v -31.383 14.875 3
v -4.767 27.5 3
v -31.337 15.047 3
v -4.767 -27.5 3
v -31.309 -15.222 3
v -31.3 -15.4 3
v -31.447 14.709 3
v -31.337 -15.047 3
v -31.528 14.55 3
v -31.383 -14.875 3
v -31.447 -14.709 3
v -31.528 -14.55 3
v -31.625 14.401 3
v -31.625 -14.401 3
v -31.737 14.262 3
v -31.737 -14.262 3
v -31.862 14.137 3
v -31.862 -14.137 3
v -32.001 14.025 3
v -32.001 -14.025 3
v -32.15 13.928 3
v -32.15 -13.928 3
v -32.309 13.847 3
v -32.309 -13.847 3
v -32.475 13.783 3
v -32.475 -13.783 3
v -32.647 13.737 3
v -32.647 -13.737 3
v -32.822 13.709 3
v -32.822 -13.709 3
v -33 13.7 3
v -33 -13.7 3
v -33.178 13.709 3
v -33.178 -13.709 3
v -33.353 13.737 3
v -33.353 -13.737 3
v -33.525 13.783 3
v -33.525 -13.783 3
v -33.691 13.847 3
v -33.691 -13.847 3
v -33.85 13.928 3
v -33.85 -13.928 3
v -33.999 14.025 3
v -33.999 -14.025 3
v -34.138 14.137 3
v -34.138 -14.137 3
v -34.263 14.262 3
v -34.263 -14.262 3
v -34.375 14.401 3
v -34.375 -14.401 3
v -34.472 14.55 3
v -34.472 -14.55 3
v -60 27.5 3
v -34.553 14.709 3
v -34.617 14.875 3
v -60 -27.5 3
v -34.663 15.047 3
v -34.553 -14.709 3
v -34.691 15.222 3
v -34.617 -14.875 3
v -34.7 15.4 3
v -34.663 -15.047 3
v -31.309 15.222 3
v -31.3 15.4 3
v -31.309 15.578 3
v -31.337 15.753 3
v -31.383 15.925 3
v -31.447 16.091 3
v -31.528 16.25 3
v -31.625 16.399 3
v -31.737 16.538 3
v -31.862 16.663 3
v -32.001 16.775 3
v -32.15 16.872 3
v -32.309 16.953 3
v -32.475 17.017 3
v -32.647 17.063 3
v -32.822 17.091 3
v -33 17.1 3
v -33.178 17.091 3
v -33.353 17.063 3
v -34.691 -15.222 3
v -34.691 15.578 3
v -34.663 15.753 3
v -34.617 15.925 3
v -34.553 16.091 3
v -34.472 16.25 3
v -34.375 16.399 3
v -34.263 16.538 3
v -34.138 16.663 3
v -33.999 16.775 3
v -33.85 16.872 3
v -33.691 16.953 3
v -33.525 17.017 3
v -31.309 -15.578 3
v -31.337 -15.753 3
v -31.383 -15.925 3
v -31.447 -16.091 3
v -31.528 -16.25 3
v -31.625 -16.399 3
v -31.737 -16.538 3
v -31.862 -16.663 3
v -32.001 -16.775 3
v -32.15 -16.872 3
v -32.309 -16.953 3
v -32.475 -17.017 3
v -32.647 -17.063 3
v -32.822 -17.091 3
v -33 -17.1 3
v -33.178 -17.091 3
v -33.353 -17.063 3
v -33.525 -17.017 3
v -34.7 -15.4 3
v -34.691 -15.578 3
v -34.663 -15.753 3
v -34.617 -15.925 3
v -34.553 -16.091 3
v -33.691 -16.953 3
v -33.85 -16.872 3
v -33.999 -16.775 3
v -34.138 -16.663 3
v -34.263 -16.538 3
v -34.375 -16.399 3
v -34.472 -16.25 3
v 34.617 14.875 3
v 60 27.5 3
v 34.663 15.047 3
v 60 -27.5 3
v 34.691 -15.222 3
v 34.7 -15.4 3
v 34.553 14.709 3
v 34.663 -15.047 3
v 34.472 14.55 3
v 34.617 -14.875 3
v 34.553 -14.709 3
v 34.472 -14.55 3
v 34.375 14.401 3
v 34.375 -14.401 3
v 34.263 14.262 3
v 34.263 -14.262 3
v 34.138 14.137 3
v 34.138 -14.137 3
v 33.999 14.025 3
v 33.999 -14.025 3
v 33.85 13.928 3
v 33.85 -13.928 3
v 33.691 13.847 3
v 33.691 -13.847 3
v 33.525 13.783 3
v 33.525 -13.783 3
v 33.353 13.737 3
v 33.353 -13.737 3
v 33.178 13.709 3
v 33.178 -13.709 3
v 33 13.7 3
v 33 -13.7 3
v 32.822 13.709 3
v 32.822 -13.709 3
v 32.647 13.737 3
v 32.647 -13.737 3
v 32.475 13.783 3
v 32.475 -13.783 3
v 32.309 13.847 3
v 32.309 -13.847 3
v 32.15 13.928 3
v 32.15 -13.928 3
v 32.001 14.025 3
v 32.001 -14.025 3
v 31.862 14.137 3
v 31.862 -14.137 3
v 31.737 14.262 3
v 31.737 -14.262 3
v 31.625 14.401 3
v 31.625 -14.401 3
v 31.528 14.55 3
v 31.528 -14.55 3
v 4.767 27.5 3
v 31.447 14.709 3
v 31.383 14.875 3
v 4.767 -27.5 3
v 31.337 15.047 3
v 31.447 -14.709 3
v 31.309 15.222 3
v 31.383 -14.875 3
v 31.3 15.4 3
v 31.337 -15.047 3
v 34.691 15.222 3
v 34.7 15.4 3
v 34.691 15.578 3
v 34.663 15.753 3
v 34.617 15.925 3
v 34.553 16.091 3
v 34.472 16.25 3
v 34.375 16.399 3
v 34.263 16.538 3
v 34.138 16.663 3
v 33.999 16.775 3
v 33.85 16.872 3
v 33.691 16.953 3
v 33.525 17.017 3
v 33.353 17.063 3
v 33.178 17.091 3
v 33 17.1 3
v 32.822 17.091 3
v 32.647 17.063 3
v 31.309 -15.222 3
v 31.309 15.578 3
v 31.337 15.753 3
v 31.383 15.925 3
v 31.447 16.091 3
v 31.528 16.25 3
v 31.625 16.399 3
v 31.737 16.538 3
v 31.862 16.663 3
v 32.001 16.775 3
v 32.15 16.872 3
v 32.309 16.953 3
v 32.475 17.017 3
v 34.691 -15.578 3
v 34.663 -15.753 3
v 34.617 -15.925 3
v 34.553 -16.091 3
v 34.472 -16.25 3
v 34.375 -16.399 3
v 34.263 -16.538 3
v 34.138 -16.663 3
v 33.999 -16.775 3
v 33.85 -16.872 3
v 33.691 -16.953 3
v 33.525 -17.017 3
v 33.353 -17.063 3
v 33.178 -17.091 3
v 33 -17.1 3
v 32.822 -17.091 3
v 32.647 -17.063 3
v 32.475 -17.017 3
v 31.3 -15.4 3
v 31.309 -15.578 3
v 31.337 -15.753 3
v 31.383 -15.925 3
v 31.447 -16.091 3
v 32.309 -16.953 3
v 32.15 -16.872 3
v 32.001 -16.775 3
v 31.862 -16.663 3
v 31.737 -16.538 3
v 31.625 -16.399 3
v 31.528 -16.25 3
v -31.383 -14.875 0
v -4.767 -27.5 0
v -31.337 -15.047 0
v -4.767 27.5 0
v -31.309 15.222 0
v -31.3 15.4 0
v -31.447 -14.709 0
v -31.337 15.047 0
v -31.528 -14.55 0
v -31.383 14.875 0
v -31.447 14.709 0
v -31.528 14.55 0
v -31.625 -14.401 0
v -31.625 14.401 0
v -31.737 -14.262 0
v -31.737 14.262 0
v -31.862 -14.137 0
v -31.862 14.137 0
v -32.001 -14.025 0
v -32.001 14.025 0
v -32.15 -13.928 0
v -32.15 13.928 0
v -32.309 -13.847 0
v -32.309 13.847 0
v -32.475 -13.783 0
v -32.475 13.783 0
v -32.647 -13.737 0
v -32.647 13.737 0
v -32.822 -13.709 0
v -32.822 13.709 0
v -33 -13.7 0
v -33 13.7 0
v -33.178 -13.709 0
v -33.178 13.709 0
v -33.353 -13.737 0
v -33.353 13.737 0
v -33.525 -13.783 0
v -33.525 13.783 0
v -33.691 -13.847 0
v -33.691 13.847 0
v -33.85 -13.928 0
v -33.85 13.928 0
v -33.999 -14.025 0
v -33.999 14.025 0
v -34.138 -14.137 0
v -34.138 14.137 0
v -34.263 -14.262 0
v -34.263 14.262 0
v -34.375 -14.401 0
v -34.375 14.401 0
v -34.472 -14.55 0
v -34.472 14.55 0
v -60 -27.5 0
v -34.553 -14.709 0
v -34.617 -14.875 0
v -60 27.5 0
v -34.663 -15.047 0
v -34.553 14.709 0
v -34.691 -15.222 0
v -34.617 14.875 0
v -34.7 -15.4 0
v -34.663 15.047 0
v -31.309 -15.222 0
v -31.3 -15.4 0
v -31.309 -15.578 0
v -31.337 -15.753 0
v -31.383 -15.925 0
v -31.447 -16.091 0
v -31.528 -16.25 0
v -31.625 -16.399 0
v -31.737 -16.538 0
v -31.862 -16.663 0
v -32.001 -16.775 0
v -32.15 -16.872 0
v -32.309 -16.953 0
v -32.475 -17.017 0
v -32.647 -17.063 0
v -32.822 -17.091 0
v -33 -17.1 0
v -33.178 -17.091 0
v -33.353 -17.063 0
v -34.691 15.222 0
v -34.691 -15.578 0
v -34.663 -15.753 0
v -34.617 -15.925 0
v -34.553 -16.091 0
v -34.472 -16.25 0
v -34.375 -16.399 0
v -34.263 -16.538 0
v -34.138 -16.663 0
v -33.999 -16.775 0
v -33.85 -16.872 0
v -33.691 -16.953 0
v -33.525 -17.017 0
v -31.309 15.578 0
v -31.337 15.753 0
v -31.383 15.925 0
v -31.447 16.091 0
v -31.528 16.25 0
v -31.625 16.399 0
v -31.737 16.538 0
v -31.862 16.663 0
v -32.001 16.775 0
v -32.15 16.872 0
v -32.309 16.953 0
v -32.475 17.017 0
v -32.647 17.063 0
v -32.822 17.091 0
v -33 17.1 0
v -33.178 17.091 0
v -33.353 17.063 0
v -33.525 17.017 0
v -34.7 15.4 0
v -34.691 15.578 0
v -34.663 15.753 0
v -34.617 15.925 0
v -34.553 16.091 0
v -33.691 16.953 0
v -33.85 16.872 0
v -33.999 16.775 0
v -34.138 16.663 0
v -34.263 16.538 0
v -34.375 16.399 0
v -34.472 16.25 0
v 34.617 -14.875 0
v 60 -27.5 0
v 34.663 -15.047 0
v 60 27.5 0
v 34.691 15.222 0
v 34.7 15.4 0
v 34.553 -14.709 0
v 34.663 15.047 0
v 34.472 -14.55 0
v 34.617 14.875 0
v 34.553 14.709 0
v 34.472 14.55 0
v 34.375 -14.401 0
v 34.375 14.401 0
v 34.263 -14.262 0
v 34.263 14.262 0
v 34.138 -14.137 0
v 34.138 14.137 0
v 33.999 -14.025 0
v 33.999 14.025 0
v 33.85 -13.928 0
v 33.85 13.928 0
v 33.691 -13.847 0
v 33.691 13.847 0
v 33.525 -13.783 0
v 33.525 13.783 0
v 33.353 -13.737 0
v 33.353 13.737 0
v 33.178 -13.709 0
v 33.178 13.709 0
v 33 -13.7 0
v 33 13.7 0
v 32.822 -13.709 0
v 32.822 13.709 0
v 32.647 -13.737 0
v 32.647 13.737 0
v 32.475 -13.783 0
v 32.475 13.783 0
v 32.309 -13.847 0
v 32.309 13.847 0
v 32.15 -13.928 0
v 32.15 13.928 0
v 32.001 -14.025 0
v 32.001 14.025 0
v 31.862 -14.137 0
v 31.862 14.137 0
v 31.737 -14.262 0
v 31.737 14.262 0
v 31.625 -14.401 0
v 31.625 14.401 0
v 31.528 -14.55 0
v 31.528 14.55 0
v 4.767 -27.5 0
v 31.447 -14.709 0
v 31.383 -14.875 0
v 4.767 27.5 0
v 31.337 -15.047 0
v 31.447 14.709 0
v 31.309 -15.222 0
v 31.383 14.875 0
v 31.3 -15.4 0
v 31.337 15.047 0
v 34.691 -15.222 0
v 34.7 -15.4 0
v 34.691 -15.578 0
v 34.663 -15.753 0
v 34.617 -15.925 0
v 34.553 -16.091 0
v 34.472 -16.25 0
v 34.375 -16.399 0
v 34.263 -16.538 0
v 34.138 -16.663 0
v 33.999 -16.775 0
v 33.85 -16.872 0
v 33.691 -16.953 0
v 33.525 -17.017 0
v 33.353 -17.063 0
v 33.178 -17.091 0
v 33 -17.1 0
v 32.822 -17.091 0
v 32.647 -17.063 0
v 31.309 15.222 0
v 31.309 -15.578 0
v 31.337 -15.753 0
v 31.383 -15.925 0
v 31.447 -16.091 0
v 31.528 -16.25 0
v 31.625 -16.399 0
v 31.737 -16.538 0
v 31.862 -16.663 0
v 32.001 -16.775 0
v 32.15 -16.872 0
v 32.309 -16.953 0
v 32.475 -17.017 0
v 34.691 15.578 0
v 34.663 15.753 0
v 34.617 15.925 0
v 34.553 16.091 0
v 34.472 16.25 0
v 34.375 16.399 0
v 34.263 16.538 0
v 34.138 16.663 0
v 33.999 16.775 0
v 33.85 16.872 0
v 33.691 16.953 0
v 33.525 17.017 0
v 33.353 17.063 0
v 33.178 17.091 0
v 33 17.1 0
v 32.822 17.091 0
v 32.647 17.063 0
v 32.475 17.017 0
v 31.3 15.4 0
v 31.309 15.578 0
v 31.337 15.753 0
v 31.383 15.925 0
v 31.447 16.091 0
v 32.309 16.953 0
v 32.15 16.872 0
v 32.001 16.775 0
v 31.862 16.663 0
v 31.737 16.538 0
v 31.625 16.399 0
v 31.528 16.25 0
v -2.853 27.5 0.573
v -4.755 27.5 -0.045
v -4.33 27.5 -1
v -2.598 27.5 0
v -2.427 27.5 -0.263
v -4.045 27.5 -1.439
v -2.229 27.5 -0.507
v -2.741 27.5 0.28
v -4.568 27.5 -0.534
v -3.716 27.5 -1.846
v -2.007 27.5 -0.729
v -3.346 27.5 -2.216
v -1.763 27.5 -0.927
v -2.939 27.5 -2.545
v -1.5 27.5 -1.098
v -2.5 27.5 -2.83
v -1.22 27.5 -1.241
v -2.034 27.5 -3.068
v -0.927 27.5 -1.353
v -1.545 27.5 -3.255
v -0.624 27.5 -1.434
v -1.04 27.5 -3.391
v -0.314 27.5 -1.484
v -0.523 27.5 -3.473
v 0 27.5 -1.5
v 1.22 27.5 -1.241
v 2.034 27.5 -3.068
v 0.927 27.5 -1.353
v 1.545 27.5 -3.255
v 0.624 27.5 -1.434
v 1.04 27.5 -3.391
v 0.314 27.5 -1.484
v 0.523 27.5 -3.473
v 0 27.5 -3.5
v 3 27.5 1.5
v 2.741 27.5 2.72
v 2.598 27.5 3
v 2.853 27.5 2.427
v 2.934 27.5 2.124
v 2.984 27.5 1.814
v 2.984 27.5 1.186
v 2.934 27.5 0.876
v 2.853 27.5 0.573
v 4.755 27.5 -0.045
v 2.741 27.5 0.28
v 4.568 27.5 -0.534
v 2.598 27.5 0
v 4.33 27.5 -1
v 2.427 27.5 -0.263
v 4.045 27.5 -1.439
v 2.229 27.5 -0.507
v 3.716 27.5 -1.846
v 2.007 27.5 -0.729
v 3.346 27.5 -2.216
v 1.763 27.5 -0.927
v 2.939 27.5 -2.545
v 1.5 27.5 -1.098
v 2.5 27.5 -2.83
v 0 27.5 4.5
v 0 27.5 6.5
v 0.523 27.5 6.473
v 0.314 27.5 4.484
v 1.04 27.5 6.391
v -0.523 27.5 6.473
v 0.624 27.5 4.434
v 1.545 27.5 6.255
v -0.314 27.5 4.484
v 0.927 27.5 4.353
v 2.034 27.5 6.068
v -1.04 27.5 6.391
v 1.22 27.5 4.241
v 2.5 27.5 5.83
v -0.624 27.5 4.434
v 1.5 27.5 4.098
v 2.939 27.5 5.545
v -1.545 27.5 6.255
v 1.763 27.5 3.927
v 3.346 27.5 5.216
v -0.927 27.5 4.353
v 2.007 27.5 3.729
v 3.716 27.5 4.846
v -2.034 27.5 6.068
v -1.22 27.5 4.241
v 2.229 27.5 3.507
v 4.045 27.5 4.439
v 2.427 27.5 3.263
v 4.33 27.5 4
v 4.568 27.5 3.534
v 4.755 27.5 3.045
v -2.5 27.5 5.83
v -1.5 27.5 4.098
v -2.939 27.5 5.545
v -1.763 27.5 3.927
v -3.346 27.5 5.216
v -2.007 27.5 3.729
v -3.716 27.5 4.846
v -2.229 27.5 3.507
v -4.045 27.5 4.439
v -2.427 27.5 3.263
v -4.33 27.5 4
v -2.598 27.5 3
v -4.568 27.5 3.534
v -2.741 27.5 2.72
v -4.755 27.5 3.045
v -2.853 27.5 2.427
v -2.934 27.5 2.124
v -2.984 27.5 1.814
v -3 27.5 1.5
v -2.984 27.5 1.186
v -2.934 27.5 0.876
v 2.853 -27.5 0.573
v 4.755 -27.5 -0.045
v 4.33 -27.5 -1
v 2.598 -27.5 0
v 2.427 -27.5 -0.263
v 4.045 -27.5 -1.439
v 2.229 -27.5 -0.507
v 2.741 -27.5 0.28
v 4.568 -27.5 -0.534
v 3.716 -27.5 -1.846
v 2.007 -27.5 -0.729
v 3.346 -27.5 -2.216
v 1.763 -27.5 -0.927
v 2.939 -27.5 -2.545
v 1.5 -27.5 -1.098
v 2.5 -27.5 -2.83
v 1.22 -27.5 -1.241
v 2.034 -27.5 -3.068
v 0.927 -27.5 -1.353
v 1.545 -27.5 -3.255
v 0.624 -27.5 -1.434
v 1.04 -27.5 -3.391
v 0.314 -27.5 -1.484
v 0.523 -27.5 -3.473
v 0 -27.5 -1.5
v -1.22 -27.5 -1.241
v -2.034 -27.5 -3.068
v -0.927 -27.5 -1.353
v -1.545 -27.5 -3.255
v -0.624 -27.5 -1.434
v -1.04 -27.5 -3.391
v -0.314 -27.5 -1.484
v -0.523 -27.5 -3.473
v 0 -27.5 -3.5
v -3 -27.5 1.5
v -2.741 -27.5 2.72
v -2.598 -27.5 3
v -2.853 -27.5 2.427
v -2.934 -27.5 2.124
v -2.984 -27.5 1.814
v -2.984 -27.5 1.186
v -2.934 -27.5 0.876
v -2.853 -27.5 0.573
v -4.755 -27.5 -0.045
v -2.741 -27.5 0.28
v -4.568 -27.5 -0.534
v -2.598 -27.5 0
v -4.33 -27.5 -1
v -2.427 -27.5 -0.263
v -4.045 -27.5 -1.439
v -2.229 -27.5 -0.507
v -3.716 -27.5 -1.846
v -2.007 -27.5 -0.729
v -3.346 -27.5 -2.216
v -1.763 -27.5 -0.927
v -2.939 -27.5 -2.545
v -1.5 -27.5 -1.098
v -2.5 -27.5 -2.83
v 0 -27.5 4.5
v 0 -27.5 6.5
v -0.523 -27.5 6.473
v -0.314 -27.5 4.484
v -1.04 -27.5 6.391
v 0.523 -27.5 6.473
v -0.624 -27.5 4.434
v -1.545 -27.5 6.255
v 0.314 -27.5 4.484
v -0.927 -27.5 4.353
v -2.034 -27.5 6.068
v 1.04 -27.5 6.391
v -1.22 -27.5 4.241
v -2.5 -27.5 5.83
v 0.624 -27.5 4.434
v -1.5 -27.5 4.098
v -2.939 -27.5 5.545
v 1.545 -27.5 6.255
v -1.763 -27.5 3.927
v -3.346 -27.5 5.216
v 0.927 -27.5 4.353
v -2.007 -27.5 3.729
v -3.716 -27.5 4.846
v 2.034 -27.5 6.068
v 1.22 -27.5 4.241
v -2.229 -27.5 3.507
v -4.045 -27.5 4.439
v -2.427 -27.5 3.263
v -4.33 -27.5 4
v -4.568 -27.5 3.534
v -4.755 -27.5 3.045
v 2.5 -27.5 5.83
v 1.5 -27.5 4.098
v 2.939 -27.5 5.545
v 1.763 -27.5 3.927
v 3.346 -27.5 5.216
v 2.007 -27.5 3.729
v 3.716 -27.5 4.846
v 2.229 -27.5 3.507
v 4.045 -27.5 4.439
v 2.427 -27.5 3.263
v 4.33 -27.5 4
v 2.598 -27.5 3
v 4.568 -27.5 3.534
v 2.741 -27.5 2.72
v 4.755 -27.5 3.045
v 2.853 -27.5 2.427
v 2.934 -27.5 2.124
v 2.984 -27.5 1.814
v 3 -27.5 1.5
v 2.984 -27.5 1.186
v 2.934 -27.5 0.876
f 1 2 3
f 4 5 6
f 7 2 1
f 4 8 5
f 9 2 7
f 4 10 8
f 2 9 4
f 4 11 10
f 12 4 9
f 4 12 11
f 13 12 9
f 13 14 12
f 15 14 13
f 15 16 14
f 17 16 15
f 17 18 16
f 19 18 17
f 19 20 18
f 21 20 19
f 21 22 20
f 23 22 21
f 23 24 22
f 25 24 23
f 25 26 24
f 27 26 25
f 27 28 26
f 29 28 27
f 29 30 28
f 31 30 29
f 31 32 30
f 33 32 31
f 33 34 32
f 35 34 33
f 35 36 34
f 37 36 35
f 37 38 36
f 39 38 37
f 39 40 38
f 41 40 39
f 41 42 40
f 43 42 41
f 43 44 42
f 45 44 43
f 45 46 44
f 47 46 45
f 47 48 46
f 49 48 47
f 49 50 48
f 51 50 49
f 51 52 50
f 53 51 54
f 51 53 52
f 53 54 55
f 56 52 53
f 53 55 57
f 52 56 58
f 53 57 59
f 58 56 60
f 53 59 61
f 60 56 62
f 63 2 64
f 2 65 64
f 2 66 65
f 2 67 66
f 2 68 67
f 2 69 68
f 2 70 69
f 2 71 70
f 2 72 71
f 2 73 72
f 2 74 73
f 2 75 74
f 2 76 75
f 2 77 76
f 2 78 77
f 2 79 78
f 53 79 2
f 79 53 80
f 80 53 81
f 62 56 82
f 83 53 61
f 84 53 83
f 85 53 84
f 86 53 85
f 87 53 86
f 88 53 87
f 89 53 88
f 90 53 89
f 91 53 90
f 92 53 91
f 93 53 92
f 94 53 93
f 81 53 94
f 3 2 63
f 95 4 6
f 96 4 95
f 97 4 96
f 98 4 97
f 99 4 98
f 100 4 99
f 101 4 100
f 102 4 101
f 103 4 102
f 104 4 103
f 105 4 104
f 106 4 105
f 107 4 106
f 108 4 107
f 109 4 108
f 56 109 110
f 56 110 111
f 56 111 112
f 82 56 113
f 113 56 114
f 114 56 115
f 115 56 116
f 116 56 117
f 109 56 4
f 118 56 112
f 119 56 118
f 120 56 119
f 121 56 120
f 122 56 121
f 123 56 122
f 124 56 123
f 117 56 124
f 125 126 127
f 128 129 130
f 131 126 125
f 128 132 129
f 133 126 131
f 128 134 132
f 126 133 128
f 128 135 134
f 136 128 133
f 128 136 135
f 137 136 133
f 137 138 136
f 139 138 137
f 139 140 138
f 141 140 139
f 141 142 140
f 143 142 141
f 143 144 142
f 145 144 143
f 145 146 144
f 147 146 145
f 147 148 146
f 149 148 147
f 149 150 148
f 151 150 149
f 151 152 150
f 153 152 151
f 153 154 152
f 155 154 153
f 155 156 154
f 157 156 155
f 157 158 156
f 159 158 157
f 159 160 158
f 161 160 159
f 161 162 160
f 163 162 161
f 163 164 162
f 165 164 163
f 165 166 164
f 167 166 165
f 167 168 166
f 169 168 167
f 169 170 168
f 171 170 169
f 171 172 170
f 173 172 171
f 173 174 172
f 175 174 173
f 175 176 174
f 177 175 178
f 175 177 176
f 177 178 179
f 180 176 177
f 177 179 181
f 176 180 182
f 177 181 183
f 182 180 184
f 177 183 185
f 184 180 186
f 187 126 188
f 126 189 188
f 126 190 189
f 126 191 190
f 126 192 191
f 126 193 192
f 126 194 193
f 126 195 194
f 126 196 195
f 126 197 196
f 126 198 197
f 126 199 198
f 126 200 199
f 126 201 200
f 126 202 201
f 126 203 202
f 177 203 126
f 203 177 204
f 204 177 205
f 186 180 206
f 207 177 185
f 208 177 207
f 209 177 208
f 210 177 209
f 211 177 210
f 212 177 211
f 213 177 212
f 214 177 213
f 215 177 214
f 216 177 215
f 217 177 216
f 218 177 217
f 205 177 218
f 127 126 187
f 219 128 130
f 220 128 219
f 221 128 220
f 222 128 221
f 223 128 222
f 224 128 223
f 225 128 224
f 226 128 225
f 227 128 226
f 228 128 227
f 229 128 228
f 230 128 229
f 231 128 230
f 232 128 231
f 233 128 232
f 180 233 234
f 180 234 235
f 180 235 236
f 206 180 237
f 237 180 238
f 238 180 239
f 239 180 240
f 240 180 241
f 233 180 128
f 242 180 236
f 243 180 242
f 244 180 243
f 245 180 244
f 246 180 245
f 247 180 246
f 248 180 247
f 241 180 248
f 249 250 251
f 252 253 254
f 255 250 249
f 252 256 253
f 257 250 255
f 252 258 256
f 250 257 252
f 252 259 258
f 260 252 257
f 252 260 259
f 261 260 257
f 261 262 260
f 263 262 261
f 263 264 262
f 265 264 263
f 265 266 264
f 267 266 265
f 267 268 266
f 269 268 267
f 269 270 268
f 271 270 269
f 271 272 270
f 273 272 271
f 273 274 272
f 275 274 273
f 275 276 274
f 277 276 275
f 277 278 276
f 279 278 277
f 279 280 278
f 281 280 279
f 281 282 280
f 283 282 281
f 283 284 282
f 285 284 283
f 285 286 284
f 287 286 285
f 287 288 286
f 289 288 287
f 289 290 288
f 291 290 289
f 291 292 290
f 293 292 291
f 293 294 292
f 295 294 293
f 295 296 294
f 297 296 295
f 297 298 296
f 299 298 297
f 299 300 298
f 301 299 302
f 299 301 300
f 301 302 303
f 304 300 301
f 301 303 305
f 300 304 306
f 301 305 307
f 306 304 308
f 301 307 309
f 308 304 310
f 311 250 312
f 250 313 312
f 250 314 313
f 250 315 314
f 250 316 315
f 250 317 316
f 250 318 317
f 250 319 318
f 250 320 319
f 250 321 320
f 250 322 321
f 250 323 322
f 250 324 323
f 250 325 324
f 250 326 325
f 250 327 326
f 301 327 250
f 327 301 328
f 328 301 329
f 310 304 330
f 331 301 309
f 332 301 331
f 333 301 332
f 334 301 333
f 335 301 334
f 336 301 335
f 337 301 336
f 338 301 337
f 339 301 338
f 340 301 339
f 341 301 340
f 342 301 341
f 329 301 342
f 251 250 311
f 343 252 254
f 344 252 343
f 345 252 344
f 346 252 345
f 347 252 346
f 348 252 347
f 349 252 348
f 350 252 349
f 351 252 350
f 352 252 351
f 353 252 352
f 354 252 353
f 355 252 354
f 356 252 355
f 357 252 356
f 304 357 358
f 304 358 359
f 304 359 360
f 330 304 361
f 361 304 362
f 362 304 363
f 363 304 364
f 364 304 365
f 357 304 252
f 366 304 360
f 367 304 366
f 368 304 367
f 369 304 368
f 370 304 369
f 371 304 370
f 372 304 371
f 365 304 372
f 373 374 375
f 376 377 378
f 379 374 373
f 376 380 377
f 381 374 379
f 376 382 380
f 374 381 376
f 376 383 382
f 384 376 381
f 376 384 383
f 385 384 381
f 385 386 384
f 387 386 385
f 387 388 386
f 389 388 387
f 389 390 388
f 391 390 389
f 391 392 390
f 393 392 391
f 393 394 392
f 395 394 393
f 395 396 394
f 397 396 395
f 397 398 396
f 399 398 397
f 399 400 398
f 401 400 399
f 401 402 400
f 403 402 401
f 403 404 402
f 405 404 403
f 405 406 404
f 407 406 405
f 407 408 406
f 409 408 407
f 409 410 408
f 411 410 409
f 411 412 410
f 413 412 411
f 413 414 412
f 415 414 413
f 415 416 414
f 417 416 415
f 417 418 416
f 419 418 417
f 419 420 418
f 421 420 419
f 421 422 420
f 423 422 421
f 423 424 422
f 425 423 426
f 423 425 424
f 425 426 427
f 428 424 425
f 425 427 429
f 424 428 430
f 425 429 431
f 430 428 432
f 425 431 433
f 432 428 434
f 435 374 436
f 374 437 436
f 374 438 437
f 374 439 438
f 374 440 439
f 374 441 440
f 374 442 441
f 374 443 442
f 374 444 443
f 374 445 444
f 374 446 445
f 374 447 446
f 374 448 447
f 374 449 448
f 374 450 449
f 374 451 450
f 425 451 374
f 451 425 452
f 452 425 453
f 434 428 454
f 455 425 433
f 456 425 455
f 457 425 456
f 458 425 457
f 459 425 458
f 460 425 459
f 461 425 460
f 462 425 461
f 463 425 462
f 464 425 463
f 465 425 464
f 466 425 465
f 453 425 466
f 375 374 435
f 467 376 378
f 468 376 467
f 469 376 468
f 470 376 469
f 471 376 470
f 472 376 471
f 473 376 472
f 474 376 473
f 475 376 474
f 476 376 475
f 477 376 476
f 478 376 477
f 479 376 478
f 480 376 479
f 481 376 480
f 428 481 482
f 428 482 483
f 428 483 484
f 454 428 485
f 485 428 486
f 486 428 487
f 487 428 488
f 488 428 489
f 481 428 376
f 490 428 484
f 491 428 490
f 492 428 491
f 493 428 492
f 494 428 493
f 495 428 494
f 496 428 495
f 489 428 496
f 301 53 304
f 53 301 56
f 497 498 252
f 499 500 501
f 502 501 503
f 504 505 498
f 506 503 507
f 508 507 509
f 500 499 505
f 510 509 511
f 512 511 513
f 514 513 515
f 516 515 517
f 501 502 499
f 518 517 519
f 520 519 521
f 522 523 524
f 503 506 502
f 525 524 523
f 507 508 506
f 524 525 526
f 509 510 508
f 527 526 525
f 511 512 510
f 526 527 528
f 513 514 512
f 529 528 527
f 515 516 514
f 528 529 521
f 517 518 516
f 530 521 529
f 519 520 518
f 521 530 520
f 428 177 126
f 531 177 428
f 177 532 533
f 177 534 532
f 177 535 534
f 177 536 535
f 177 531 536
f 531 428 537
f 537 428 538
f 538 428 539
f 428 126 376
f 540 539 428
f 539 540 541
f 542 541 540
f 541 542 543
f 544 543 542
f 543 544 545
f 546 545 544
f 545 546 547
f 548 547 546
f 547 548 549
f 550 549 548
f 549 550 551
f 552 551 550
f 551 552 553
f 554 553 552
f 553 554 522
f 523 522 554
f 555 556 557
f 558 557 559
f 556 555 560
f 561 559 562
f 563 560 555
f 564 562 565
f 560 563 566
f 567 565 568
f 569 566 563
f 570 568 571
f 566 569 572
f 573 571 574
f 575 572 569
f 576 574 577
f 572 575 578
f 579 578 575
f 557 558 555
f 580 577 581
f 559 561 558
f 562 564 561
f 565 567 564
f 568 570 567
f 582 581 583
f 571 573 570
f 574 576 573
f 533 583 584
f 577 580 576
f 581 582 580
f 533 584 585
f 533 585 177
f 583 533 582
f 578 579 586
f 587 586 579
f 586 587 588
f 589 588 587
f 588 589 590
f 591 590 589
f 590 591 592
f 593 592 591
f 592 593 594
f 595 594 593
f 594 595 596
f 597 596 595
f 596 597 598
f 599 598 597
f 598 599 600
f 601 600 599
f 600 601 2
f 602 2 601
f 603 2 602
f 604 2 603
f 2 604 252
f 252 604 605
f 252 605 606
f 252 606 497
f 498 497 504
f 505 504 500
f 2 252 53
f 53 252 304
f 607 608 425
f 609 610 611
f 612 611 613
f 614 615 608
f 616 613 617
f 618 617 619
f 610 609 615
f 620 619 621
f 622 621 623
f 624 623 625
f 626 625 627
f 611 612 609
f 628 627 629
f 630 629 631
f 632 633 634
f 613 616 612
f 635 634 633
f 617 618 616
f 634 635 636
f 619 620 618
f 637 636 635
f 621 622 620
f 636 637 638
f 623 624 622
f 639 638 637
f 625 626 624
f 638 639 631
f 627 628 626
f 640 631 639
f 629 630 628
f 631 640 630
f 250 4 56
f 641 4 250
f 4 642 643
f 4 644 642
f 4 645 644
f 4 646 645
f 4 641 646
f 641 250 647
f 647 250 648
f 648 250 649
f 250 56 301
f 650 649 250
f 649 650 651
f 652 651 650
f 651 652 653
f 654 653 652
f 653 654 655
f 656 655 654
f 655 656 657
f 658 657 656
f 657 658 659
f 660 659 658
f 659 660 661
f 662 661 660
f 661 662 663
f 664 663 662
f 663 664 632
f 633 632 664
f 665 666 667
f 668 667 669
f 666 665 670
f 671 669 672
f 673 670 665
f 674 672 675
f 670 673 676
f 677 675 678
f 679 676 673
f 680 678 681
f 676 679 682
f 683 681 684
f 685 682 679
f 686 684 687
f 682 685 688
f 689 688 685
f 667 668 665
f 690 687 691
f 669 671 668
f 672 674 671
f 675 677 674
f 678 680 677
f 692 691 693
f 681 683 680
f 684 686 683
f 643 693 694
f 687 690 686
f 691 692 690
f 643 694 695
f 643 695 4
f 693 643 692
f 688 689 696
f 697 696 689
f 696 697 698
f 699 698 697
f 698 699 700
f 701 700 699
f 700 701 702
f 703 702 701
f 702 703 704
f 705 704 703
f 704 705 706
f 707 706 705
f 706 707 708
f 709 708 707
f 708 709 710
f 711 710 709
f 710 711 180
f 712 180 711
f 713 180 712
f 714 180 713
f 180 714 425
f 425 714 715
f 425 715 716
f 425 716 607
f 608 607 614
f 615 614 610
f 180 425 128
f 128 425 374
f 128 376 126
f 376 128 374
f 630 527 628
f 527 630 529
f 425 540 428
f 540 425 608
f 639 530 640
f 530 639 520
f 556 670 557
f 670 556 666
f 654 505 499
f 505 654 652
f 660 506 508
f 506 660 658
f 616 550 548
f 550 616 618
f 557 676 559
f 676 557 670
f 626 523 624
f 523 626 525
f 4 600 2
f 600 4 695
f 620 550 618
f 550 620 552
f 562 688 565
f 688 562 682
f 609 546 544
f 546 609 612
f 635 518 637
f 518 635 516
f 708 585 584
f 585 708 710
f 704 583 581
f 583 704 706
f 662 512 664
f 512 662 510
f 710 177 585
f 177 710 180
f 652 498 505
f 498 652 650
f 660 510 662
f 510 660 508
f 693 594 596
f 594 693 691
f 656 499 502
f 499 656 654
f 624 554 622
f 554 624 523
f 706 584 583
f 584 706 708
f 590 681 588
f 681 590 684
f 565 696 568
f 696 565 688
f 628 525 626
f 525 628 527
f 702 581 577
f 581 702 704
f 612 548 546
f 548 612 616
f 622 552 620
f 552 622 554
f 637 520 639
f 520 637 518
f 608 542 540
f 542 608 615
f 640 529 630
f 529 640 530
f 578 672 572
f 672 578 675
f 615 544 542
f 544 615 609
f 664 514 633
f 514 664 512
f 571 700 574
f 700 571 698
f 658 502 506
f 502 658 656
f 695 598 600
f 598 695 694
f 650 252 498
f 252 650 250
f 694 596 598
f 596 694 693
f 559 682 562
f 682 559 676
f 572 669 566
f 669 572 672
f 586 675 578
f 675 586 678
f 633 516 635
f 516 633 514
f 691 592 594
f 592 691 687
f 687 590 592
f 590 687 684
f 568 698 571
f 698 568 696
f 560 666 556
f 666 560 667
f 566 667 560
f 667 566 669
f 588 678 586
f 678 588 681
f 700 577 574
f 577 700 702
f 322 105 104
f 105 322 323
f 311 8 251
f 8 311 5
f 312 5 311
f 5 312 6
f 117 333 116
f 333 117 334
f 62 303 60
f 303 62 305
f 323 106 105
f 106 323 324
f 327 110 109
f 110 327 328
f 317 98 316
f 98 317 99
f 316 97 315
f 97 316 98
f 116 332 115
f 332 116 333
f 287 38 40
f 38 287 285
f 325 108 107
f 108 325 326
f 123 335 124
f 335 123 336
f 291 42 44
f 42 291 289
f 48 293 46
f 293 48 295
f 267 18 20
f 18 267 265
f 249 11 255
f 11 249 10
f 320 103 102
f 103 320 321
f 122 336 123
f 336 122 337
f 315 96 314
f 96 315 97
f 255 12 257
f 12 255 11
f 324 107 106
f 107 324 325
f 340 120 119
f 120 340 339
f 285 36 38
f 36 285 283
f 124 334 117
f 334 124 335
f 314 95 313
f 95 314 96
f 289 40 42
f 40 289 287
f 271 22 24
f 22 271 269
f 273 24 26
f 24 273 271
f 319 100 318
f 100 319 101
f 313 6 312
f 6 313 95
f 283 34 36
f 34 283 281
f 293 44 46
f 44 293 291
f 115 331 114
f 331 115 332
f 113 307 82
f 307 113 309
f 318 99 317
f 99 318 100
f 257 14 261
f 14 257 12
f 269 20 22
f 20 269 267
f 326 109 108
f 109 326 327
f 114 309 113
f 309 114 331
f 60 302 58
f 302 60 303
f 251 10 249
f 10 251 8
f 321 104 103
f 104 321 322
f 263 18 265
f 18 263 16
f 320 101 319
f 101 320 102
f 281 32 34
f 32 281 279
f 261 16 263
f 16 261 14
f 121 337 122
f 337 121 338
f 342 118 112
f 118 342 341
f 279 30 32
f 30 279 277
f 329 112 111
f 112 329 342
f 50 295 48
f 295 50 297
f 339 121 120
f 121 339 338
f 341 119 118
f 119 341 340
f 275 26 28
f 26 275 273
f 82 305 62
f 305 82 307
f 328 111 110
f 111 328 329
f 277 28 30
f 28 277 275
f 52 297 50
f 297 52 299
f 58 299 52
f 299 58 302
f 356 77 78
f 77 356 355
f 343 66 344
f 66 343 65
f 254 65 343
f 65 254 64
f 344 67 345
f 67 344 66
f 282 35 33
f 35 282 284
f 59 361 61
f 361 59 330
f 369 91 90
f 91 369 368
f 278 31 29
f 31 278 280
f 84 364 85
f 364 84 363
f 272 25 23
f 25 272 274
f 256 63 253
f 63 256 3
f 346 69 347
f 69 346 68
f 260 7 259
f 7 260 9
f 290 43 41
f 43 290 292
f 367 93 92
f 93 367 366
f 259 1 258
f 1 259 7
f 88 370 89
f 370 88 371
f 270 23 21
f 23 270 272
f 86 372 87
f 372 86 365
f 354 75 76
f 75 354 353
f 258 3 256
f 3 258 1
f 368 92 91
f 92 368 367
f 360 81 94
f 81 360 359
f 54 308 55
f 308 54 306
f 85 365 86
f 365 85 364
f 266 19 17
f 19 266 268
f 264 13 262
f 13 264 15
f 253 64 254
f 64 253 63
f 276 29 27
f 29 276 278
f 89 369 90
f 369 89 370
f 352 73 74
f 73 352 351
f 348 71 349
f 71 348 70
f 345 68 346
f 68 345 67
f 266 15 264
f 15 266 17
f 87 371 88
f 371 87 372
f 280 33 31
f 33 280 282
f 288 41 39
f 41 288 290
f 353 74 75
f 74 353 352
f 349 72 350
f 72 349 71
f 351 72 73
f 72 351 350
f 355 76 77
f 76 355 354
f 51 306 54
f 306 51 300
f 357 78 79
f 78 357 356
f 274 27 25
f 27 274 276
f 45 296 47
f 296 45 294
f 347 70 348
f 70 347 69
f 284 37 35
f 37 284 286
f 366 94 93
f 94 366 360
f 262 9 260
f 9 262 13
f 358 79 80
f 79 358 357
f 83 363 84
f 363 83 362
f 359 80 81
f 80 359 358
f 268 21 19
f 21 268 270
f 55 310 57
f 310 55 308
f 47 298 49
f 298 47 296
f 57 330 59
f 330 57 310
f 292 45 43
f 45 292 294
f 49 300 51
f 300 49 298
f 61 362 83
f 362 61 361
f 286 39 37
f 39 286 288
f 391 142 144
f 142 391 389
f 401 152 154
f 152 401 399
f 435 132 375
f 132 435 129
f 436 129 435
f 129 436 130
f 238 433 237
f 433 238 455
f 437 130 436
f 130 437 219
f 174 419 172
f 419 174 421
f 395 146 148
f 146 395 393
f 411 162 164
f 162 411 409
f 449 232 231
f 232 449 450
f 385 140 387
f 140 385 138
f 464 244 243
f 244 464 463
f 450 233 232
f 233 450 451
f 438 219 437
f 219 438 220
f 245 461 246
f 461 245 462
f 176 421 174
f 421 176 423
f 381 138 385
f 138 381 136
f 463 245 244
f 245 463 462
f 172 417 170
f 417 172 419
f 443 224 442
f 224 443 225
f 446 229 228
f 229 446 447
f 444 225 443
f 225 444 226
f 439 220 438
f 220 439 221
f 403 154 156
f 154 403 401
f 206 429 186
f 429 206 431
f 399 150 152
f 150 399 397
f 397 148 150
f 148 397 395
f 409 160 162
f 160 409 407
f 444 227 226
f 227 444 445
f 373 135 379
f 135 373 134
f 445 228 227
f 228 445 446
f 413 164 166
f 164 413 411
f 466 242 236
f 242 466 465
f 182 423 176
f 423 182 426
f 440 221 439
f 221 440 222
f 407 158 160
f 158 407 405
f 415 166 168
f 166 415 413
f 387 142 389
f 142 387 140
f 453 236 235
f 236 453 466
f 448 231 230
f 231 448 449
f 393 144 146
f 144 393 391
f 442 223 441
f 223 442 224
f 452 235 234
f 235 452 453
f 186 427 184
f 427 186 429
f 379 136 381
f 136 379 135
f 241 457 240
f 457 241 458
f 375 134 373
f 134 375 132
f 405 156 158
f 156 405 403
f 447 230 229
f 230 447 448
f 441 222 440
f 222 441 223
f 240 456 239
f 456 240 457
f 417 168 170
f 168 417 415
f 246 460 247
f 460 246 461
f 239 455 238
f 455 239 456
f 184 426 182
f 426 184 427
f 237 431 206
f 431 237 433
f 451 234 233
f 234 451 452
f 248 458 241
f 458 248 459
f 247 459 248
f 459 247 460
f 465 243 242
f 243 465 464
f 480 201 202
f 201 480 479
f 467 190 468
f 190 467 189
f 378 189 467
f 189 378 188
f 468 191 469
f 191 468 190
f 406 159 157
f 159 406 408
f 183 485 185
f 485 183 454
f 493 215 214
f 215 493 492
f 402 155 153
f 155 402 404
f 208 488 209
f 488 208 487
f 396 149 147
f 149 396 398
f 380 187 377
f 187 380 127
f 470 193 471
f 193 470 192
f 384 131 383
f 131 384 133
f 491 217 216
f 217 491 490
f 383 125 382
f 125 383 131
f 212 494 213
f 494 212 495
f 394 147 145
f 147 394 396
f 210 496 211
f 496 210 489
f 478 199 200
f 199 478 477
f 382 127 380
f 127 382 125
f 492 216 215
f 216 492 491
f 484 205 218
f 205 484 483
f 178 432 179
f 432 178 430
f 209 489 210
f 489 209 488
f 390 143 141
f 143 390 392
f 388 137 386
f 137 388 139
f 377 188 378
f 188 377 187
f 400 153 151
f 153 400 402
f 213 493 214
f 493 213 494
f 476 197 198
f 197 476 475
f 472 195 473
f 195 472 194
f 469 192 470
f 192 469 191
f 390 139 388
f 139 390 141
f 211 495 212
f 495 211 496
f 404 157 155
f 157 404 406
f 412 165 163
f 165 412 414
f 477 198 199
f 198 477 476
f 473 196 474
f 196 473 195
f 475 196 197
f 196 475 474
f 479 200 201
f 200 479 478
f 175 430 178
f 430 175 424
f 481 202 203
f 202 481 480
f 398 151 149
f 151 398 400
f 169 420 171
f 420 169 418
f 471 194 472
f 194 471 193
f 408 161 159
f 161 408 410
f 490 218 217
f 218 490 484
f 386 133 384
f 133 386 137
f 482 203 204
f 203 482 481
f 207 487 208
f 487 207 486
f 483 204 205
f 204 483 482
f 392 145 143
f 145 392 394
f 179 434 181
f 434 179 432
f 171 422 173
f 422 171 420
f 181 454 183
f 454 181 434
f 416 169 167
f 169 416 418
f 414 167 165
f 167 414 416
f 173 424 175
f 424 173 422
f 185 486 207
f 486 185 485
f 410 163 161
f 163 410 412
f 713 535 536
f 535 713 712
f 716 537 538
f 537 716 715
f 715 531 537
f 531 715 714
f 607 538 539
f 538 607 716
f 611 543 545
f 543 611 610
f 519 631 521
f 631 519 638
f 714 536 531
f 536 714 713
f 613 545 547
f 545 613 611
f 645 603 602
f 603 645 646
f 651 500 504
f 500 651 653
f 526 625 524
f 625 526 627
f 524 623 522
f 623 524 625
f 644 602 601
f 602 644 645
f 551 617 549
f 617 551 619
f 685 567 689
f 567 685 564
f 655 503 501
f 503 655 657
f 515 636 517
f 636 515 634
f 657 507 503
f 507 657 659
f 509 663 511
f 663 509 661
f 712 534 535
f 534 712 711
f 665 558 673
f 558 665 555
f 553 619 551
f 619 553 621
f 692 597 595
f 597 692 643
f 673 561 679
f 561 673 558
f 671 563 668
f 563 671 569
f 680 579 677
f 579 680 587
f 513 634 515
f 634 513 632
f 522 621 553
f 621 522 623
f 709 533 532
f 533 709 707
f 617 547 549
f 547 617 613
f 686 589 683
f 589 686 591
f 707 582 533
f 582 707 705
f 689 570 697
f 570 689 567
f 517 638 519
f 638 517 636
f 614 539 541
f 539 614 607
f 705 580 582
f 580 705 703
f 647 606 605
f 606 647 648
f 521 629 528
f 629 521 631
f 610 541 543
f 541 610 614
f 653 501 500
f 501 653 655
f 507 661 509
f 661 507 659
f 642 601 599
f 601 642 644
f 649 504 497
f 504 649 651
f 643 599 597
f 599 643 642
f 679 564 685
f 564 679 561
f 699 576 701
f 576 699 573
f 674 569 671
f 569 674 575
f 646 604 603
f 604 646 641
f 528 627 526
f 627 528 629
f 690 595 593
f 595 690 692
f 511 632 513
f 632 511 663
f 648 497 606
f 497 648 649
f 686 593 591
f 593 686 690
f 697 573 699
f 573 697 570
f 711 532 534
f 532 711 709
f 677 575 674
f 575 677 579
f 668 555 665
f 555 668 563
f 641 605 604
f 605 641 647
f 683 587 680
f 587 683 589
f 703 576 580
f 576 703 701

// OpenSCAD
// Two-leaf hinge with a printable straight pin barrel.
$fn = 60;
eps = 0.02;
leaf_l = 60;
leaf_w = 55;
leaf_t = 3;
pin_d = 6;
barrel_d = pin_d + 4;
difference() {
    union() {
        translate([-leaf_l, -leaf_w / 2, 0]) cube([leaf_l, leaf_w, leaf_t]);
        translate([0, -leaf_w / 2, 0]) cube([leaf_l, leaf_w, leaf_t]);
        translate([0, -leaf_w / 2, leaf_t / 2]) rotate([-90, 0, 0]) cylinder(d = barrel_d, h = leaf_w);
    }
    translate([0, -leaf_w / 2 - eps, leaf_t / 2]) rotate([-90, 0, 0]) cylinder(d = pin_d, h = leaf_w + 2 * eps);
    for (x = [-leaf_l * 0.55, leaf_l * 0.55], y = [-leaf_w * 0.28, leaf_w * 0.28])
        translate([x, y, -eps]) cylinder(d = 3.4, h = leaf_t + 2 * eps);
}
